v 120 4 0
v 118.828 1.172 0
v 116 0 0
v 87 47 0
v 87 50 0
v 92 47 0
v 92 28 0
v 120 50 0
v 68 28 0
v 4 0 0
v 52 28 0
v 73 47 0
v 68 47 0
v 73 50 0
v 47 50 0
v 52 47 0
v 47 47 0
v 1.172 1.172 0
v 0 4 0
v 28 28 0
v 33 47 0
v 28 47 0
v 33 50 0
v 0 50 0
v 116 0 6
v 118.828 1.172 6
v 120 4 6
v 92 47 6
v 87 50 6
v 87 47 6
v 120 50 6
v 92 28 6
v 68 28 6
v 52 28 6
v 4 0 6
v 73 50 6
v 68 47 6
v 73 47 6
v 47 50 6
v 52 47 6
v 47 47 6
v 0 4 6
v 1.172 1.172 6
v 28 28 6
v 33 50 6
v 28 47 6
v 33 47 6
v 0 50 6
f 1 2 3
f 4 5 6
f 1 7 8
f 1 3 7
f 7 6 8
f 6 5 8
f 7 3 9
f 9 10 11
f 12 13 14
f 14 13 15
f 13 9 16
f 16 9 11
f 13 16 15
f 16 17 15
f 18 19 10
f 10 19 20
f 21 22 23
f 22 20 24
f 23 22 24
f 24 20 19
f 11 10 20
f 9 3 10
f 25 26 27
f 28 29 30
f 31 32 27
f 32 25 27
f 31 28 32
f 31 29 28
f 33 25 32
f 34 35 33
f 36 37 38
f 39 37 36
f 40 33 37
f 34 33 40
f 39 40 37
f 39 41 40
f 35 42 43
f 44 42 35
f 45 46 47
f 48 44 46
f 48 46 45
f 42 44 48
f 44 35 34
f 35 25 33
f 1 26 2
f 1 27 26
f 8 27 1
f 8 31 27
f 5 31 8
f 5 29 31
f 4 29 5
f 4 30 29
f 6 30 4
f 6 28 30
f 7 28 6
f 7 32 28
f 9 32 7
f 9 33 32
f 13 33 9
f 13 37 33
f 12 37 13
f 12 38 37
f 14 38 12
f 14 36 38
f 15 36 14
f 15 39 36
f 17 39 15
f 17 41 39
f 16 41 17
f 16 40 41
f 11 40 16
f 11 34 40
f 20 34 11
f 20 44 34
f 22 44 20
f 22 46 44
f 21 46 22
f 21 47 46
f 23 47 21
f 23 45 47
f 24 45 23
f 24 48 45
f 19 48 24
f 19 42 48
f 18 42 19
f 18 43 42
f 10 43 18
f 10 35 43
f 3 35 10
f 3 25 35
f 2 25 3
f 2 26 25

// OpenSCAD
$fn = 32;

// ----------------------------------------------------------------------
// Oversize slot bar: 120 mm bar with 2 oversize windows
// ----------------------------------------------------------------------

// --- parameters (mm) ---
profile_height = 6;       // extrusion height
profile_points = 24;      // points of the closed outline

profile = [[0, 4], [1.172, 1.172], [4, 0], [116, 0], [118.828, 1.172], [120, 4], [120, 50], [87, 50], [87, 47], [92, 47], [92, 28], [68, 28], [68, 47], [73, 47], [73, 50], [47, 50], [47, 47], [52, 47], [52, 28], [28, 28], [28, 47], [33, 47], [33, 50], [0, 50]];  // single closed polygon, 24 points, counter clockwise

// --- the one profile operation ---
linear_extrude(height = profile_height) polygon(points = profile);
